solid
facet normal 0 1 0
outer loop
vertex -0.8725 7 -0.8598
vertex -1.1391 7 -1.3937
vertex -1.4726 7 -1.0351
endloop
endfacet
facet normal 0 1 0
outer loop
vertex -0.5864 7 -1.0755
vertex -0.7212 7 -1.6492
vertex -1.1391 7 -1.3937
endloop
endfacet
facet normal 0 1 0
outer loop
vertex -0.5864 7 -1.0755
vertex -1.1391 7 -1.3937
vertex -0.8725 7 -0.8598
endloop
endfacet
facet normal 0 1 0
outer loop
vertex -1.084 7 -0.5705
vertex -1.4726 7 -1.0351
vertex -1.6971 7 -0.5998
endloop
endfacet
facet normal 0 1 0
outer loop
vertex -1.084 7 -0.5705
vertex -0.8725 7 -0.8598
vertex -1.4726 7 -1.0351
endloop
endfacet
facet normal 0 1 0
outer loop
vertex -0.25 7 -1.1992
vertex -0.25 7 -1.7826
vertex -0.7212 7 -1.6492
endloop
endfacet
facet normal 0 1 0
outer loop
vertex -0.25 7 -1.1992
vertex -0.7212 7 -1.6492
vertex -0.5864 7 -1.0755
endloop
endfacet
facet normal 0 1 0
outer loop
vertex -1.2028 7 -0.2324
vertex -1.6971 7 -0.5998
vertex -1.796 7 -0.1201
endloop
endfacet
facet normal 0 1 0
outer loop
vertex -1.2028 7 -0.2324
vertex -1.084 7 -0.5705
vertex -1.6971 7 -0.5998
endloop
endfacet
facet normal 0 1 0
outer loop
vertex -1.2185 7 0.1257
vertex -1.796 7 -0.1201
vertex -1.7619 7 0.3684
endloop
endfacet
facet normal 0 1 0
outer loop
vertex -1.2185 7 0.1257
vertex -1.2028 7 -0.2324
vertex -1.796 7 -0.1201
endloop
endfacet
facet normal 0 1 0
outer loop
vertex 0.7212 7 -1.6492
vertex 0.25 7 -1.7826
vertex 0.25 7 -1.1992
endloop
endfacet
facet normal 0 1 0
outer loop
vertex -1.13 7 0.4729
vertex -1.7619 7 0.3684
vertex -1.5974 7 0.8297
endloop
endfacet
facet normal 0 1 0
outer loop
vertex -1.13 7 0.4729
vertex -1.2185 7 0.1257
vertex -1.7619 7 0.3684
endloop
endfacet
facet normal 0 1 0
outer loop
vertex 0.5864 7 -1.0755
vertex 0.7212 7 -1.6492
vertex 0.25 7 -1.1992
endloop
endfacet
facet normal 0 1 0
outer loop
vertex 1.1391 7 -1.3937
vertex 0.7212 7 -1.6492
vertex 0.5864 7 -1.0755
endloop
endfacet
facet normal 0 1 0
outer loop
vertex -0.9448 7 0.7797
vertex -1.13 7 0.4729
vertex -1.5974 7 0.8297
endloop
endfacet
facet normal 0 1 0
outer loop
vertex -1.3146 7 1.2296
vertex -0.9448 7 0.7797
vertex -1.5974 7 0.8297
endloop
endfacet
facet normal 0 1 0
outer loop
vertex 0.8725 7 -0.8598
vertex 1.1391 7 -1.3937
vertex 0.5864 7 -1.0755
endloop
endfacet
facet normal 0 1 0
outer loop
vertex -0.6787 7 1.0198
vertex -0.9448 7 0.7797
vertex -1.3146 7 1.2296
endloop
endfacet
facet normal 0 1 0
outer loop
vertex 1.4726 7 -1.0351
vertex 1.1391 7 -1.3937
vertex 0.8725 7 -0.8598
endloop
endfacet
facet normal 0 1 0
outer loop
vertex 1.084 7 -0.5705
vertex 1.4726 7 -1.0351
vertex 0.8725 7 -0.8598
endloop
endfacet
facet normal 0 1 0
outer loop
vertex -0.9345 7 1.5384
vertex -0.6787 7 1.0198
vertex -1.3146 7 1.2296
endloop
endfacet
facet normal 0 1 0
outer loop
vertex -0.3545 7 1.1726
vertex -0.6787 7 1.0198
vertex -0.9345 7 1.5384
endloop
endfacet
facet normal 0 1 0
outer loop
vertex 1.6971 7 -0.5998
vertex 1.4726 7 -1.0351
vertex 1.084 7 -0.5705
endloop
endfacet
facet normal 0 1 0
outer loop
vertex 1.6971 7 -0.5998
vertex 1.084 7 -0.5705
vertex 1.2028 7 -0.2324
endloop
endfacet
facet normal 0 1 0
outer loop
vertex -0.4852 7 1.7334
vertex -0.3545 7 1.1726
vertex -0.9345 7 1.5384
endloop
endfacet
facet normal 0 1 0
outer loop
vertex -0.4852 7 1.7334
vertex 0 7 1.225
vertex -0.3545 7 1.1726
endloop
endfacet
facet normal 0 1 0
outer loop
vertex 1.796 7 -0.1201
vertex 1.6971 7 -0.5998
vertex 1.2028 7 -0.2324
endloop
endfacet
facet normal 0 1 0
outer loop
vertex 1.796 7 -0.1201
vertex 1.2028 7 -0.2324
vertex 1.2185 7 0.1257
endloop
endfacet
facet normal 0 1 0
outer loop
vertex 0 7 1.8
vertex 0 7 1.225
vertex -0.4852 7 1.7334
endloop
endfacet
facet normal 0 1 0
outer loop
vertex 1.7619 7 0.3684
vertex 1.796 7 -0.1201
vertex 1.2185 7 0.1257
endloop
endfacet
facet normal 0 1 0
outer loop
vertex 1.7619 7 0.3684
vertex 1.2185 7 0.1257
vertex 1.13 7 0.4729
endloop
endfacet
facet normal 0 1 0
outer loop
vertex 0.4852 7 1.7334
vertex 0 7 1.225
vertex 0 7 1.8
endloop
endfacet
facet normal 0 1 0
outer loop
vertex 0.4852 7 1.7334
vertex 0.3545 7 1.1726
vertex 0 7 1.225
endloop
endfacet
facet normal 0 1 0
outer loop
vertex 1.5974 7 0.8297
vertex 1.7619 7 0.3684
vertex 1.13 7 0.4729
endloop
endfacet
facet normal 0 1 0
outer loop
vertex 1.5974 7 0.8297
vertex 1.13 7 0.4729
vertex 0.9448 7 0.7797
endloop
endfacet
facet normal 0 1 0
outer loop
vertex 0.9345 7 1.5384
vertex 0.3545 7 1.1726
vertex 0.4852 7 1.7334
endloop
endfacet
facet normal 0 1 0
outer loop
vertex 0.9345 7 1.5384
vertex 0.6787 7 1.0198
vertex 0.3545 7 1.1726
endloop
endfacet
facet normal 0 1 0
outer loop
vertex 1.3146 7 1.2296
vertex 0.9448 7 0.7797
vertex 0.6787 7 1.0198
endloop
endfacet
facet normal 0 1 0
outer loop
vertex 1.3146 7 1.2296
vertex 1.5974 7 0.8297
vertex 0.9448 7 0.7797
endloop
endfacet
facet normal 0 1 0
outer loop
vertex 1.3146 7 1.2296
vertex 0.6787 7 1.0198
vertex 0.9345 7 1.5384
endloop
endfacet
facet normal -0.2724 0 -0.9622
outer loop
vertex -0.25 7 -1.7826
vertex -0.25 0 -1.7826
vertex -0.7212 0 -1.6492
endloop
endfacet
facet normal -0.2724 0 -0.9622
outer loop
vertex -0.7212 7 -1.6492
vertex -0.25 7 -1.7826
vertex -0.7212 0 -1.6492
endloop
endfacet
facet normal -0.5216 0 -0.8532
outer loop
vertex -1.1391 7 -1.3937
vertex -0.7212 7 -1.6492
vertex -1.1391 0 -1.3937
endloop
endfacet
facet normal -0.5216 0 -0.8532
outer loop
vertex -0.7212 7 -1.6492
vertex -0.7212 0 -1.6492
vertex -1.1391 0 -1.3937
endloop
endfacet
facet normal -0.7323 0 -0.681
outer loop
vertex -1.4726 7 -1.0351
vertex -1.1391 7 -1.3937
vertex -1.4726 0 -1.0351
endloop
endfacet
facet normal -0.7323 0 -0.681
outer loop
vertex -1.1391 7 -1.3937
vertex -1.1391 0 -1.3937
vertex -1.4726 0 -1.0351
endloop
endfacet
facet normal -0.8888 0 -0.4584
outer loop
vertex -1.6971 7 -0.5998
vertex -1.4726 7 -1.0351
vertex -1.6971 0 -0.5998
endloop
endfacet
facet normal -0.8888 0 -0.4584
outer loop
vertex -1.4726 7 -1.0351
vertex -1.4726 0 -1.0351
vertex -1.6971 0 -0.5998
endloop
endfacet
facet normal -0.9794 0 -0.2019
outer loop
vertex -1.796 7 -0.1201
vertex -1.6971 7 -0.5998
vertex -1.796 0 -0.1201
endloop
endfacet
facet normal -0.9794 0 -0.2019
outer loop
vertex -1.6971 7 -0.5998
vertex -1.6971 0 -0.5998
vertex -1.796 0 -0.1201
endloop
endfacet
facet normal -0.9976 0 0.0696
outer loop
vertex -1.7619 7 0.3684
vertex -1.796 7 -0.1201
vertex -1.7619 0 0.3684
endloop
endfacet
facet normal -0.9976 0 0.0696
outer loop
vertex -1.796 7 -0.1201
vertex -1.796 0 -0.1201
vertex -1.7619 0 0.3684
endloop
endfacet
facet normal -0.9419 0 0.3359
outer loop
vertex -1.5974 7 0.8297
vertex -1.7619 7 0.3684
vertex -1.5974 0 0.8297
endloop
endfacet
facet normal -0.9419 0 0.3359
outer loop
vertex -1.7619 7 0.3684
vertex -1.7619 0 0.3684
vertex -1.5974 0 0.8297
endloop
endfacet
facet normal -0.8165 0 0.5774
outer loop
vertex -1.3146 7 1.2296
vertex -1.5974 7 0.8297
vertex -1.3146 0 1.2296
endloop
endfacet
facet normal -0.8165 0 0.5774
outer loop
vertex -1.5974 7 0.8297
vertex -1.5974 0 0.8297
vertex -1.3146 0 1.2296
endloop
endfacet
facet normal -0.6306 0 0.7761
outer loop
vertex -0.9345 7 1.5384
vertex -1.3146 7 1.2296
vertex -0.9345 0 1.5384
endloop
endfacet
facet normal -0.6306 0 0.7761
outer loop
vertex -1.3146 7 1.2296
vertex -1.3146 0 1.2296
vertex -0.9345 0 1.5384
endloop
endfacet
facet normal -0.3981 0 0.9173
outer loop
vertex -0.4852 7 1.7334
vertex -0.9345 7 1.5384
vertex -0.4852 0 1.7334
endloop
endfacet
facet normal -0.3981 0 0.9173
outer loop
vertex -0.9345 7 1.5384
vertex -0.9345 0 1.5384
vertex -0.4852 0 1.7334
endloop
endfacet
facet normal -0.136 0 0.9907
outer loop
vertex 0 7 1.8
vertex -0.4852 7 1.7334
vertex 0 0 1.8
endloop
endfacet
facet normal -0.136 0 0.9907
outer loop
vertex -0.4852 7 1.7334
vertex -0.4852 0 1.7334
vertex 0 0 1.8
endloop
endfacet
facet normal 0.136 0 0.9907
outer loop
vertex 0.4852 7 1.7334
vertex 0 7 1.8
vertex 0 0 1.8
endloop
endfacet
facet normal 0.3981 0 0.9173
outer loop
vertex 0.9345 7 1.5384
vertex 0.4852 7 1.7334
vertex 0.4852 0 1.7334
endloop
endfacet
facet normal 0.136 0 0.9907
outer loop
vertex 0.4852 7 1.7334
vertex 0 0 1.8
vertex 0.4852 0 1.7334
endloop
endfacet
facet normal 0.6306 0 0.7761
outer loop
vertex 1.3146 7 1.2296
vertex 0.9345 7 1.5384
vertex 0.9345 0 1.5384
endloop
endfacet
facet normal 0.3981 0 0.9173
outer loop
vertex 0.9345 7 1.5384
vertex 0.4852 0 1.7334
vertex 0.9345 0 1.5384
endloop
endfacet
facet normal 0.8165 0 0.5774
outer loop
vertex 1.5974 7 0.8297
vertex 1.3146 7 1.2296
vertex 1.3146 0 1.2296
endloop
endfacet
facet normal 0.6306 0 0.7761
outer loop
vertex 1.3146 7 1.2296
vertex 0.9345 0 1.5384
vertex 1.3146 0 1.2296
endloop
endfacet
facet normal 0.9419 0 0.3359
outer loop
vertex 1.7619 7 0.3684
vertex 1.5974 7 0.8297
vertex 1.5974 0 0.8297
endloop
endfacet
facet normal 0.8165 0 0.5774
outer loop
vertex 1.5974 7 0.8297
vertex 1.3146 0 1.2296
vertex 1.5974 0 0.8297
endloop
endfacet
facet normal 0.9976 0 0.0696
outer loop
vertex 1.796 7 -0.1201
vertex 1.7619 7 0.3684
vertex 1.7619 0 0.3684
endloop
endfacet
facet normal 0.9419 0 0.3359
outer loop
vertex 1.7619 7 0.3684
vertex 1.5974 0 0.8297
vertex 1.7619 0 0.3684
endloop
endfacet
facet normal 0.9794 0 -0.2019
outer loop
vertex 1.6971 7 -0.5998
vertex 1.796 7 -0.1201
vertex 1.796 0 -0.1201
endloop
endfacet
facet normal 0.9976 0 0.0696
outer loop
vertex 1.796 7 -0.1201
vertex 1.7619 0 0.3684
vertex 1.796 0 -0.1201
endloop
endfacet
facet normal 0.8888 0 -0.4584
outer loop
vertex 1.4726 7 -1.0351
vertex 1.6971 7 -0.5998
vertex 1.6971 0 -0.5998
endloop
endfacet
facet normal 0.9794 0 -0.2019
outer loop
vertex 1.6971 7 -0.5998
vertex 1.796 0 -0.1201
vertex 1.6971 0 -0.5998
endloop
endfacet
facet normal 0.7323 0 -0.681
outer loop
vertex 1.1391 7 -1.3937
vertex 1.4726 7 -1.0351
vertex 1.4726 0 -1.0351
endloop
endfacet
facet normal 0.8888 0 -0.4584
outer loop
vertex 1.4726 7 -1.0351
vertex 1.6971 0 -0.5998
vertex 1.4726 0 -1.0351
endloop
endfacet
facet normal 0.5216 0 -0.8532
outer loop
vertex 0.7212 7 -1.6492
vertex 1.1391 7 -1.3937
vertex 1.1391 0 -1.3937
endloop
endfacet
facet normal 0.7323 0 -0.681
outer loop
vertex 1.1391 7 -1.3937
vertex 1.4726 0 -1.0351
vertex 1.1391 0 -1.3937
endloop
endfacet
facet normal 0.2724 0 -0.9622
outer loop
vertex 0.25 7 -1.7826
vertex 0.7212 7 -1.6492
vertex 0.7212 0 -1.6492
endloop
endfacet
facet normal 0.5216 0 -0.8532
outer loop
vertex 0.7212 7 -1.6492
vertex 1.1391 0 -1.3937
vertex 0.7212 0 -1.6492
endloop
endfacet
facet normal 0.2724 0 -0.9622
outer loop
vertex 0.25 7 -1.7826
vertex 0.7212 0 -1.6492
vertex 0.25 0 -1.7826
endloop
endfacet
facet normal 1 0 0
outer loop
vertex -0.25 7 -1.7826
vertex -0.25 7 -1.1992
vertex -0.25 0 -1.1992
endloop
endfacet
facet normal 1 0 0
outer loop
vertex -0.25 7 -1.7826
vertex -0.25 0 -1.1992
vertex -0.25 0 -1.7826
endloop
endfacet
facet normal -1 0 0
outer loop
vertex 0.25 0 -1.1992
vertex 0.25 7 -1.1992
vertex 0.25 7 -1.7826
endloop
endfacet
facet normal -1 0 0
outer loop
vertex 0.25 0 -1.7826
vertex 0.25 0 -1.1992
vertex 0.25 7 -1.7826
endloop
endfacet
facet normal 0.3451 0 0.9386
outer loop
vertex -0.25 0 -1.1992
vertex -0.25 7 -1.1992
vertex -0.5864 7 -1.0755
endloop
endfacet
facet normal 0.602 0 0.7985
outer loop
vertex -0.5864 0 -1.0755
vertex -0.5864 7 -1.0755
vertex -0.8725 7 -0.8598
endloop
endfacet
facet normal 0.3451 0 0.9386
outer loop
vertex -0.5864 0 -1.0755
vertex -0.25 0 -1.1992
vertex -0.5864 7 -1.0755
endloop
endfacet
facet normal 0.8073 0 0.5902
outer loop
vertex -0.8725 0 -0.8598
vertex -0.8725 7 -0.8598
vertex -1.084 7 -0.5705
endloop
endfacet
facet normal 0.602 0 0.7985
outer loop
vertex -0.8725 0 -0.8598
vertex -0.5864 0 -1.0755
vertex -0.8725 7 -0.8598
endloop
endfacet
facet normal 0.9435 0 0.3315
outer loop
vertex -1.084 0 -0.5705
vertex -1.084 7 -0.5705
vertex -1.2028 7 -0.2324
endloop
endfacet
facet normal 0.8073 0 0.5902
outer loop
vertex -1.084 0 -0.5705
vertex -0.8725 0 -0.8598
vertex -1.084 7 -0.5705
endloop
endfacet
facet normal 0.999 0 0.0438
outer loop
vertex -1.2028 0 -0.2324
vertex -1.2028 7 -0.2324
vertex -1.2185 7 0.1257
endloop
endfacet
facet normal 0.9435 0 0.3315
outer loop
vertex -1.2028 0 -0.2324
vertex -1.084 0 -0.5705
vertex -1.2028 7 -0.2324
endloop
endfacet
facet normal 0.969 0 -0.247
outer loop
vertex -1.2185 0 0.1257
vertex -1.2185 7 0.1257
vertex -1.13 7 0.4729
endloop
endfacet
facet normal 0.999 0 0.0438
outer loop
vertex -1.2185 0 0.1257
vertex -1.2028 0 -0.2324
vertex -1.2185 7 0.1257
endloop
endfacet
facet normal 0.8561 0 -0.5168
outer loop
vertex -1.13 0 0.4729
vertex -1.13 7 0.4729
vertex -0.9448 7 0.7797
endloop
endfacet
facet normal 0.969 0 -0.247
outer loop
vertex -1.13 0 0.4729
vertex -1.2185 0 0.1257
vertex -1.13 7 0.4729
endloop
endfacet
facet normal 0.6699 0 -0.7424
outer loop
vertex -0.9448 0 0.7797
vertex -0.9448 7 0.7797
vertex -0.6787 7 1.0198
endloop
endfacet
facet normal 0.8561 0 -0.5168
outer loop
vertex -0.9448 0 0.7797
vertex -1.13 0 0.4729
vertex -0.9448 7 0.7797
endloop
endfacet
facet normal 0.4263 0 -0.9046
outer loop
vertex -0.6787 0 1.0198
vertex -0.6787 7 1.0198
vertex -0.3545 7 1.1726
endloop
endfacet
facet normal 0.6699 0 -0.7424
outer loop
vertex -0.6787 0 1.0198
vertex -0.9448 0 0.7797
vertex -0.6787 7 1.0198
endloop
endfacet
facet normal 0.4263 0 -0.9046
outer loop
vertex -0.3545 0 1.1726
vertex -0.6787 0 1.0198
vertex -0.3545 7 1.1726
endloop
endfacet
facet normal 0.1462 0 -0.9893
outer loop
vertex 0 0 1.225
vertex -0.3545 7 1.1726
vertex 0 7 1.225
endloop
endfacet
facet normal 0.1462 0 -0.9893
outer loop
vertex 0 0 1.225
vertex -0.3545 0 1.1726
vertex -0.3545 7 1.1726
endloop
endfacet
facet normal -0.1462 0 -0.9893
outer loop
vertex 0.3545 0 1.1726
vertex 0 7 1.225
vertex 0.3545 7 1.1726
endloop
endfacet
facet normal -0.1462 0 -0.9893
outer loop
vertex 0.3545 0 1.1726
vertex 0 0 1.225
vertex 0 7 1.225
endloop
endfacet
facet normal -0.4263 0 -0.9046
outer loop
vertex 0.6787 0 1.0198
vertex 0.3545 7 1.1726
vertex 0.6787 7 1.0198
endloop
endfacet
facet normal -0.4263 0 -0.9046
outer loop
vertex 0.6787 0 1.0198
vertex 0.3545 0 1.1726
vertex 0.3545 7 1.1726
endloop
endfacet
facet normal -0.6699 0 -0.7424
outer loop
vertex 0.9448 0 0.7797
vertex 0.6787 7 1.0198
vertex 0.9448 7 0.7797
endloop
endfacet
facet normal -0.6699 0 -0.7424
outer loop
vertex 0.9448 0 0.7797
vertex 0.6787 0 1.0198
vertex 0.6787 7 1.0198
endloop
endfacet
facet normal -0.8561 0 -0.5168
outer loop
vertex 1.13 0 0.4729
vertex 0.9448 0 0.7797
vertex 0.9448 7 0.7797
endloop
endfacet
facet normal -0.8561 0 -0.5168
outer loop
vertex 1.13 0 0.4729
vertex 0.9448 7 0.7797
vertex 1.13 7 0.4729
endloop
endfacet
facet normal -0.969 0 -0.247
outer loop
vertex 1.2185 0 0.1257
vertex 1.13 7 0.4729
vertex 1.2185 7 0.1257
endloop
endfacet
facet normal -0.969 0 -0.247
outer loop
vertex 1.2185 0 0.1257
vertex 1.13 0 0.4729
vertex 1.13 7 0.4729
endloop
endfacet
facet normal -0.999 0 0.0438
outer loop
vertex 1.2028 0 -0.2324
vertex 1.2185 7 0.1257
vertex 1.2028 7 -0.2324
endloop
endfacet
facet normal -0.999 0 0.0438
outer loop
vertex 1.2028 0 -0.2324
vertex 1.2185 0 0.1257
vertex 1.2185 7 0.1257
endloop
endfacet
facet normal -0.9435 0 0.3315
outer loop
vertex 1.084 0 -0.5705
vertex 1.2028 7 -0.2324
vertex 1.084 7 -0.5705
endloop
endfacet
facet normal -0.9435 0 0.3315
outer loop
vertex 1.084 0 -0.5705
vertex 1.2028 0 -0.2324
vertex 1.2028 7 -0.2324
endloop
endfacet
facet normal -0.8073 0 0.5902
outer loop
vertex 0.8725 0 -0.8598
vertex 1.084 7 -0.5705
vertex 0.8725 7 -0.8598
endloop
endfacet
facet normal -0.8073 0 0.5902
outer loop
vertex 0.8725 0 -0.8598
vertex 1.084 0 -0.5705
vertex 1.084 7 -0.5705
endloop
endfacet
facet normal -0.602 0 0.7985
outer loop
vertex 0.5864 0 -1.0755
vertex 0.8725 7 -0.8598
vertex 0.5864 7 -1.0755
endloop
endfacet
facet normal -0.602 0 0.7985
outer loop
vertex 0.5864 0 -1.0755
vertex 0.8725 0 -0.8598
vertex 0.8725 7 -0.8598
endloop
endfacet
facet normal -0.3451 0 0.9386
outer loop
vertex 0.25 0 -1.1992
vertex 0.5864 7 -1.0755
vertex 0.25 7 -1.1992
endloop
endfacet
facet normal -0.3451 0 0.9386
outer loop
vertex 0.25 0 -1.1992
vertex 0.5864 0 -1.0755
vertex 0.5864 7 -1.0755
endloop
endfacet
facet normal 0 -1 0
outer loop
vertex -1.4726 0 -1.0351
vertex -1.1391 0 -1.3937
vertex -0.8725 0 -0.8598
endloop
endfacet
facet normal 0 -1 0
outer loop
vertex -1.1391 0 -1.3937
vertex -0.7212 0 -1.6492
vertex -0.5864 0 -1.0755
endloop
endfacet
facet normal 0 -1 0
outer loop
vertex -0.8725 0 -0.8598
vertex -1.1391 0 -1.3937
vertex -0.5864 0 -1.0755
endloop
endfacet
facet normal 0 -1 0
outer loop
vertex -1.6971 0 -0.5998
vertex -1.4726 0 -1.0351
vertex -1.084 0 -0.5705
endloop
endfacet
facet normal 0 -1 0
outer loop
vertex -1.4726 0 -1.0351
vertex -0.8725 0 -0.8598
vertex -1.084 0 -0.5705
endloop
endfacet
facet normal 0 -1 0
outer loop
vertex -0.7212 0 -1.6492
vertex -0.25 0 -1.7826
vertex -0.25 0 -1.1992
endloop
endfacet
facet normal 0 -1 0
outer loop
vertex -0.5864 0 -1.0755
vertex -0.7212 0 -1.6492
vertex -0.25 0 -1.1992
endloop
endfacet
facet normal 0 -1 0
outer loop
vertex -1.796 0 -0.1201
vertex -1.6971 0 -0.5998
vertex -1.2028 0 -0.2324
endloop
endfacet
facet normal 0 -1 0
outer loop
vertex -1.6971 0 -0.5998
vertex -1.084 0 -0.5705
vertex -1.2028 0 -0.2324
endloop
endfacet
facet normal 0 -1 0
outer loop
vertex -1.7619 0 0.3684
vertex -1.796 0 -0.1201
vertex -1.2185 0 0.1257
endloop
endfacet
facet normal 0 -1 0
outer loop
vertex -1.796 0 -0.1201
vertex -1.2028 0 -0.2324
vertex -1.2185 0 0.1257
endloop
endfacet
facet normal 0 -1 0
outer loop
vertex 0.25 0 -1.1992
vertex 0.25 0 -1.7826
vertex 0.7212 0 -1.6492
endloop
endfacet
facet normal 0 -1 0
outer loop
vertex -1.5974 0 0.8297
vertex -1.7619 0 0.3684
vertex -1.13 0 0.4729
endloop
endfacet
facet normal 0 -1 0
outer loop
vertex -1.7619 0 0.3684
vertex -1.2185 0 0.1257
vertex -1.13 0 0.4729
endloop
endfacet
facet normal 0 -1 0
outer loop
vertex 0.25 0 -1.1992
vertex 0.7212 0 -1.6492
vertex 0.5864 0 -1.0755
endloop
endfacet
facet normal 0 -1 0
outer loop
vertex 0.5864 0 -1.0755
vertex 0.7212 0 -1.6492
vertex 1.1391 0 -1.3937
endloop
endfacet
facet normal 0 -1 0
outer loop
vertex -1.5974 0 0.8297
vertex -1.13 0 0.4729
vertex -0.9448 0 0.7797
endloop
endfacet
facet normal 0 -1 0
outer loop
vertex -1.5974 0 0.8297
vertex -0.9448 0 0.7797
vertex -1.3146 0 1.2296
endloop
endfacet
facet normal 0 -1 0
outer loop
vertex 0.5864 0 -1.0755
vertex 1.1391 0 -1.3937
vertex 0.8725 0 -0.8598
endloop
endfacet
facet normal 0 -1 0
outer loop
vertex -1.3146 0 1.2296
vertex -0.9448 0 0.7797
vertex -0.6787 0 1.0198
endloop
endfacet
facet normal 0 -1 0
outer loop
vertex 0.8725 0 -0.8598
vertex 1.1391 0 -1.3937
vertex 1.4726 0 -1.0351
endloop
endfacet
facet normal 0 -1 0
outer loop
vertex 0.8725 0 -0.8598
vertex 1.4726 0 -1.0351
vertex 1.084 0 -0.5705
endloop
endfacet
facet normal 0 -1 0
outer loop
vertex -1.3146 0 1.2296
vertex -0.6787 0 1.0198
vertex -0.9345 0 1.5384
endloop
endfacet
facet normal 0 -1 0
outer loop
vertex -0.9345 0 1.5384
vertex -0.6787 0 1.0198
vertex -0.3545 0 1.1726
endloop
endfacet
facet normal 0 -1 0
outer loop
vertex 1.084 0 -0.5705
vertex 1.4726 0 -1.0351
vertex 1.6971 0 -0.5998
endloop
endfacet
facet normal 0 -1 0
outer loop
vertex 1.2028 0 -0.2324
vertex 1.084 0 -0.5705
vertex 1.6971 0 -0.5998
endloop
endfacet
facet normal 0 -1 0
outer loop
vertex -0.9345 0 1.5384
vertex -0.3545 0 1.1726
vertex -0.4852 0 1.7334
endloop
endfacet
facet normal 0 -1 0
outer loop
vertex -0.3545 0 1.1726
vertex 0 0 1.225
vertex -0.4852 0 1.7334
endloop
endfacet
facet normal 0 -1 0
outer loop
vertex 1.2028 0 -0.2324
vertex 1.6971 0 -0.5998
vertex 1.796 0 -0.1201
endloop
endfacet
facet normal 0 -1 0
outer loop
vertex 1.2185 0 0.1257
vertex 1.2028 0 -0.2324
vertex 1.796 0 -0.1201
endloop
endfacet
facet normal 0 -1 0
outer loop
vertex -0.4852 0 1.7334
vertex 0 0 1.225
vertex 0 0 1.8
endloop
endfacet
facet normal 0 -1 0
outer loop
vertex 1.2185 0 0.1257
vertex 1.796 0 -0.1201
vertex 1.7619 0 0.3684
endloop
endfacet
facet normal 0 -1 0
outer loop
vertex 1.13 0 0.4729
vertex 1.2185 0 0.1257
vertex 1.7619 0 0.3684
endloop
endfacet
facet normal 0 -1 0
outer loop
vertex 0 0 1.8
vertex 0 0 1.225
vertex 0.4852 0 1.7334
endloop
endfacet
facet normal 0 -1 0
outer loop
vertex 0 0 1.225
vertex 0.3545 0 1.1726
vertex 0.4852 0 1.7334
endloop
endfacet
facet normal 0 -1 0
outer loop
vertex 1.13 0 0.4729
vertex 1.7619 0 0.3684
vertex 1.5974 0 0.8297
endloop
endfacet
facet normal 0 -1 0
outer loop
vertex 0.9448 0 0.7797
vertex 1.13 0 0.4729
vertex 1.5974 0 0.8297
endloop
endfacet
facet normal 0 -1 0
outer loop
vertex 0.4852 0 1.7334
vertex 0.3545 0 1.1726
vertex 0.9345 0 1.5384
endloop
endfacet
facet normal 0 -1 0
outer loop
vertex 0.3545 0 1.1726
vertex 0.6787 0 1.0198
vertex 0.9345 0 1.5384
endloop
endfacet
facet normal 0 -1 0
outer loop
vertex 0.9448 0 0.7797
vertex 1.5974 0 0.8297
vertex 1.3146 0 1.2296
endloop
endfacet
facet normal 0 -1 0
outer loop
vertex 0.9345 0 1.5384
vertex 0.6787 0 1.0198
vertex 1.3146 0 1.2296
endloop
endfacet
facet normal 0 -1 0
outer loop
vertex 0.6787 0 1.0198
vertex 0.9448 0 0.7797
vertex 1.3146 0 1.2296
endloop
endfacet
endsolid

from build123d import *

# Parameters (mm, degrees)
SKETCH_1_R          = 1.8
SKETCH_1_R_2        = 1.225
EXTRUDE_1_DEPTH     = 7
SKETCH_2_W          = 0.5
SKETCH_2_H          = 2.37615298
CUT_EXTRUDE_1_DEPTH = 8.44848978


with BuildPart() as part:
    # 草图1 → 凸台-拉伸1 (new body)
    with BuildSketch(Plane(origin=(0, 0, 0), x_dir=(1, 0, 0), z_dir=(0, 1, 0))):
        with Locations(Location((0, 0, 0), (0, 0, 270))):
            Circle(SKETCH_1_R)
        with Locations(Location((0, 0, 0), (0, 0, 270))):
            Circle(SKETCH_1_R_2, mode=Mode.SUBTRACT)
    extrude(amount=EXTRUDE_1_DEPTH)

    # 草图2 → 切除-拉伸1 (cut, through all)
    with BuildSketch(Plane(origin=(0, 7, 0), x_dir=(1, 0, 0), z_dir=(0, 1, 0))):
        with Locations((0, 1.8)):
            Rectangle(SKETCH_2_W, SKETCH_2_H)
    extrude(amount=-CUT_EXTRUDE_1_DEPTH, mode=Mode.SUBTRACT)


solid = part.part
